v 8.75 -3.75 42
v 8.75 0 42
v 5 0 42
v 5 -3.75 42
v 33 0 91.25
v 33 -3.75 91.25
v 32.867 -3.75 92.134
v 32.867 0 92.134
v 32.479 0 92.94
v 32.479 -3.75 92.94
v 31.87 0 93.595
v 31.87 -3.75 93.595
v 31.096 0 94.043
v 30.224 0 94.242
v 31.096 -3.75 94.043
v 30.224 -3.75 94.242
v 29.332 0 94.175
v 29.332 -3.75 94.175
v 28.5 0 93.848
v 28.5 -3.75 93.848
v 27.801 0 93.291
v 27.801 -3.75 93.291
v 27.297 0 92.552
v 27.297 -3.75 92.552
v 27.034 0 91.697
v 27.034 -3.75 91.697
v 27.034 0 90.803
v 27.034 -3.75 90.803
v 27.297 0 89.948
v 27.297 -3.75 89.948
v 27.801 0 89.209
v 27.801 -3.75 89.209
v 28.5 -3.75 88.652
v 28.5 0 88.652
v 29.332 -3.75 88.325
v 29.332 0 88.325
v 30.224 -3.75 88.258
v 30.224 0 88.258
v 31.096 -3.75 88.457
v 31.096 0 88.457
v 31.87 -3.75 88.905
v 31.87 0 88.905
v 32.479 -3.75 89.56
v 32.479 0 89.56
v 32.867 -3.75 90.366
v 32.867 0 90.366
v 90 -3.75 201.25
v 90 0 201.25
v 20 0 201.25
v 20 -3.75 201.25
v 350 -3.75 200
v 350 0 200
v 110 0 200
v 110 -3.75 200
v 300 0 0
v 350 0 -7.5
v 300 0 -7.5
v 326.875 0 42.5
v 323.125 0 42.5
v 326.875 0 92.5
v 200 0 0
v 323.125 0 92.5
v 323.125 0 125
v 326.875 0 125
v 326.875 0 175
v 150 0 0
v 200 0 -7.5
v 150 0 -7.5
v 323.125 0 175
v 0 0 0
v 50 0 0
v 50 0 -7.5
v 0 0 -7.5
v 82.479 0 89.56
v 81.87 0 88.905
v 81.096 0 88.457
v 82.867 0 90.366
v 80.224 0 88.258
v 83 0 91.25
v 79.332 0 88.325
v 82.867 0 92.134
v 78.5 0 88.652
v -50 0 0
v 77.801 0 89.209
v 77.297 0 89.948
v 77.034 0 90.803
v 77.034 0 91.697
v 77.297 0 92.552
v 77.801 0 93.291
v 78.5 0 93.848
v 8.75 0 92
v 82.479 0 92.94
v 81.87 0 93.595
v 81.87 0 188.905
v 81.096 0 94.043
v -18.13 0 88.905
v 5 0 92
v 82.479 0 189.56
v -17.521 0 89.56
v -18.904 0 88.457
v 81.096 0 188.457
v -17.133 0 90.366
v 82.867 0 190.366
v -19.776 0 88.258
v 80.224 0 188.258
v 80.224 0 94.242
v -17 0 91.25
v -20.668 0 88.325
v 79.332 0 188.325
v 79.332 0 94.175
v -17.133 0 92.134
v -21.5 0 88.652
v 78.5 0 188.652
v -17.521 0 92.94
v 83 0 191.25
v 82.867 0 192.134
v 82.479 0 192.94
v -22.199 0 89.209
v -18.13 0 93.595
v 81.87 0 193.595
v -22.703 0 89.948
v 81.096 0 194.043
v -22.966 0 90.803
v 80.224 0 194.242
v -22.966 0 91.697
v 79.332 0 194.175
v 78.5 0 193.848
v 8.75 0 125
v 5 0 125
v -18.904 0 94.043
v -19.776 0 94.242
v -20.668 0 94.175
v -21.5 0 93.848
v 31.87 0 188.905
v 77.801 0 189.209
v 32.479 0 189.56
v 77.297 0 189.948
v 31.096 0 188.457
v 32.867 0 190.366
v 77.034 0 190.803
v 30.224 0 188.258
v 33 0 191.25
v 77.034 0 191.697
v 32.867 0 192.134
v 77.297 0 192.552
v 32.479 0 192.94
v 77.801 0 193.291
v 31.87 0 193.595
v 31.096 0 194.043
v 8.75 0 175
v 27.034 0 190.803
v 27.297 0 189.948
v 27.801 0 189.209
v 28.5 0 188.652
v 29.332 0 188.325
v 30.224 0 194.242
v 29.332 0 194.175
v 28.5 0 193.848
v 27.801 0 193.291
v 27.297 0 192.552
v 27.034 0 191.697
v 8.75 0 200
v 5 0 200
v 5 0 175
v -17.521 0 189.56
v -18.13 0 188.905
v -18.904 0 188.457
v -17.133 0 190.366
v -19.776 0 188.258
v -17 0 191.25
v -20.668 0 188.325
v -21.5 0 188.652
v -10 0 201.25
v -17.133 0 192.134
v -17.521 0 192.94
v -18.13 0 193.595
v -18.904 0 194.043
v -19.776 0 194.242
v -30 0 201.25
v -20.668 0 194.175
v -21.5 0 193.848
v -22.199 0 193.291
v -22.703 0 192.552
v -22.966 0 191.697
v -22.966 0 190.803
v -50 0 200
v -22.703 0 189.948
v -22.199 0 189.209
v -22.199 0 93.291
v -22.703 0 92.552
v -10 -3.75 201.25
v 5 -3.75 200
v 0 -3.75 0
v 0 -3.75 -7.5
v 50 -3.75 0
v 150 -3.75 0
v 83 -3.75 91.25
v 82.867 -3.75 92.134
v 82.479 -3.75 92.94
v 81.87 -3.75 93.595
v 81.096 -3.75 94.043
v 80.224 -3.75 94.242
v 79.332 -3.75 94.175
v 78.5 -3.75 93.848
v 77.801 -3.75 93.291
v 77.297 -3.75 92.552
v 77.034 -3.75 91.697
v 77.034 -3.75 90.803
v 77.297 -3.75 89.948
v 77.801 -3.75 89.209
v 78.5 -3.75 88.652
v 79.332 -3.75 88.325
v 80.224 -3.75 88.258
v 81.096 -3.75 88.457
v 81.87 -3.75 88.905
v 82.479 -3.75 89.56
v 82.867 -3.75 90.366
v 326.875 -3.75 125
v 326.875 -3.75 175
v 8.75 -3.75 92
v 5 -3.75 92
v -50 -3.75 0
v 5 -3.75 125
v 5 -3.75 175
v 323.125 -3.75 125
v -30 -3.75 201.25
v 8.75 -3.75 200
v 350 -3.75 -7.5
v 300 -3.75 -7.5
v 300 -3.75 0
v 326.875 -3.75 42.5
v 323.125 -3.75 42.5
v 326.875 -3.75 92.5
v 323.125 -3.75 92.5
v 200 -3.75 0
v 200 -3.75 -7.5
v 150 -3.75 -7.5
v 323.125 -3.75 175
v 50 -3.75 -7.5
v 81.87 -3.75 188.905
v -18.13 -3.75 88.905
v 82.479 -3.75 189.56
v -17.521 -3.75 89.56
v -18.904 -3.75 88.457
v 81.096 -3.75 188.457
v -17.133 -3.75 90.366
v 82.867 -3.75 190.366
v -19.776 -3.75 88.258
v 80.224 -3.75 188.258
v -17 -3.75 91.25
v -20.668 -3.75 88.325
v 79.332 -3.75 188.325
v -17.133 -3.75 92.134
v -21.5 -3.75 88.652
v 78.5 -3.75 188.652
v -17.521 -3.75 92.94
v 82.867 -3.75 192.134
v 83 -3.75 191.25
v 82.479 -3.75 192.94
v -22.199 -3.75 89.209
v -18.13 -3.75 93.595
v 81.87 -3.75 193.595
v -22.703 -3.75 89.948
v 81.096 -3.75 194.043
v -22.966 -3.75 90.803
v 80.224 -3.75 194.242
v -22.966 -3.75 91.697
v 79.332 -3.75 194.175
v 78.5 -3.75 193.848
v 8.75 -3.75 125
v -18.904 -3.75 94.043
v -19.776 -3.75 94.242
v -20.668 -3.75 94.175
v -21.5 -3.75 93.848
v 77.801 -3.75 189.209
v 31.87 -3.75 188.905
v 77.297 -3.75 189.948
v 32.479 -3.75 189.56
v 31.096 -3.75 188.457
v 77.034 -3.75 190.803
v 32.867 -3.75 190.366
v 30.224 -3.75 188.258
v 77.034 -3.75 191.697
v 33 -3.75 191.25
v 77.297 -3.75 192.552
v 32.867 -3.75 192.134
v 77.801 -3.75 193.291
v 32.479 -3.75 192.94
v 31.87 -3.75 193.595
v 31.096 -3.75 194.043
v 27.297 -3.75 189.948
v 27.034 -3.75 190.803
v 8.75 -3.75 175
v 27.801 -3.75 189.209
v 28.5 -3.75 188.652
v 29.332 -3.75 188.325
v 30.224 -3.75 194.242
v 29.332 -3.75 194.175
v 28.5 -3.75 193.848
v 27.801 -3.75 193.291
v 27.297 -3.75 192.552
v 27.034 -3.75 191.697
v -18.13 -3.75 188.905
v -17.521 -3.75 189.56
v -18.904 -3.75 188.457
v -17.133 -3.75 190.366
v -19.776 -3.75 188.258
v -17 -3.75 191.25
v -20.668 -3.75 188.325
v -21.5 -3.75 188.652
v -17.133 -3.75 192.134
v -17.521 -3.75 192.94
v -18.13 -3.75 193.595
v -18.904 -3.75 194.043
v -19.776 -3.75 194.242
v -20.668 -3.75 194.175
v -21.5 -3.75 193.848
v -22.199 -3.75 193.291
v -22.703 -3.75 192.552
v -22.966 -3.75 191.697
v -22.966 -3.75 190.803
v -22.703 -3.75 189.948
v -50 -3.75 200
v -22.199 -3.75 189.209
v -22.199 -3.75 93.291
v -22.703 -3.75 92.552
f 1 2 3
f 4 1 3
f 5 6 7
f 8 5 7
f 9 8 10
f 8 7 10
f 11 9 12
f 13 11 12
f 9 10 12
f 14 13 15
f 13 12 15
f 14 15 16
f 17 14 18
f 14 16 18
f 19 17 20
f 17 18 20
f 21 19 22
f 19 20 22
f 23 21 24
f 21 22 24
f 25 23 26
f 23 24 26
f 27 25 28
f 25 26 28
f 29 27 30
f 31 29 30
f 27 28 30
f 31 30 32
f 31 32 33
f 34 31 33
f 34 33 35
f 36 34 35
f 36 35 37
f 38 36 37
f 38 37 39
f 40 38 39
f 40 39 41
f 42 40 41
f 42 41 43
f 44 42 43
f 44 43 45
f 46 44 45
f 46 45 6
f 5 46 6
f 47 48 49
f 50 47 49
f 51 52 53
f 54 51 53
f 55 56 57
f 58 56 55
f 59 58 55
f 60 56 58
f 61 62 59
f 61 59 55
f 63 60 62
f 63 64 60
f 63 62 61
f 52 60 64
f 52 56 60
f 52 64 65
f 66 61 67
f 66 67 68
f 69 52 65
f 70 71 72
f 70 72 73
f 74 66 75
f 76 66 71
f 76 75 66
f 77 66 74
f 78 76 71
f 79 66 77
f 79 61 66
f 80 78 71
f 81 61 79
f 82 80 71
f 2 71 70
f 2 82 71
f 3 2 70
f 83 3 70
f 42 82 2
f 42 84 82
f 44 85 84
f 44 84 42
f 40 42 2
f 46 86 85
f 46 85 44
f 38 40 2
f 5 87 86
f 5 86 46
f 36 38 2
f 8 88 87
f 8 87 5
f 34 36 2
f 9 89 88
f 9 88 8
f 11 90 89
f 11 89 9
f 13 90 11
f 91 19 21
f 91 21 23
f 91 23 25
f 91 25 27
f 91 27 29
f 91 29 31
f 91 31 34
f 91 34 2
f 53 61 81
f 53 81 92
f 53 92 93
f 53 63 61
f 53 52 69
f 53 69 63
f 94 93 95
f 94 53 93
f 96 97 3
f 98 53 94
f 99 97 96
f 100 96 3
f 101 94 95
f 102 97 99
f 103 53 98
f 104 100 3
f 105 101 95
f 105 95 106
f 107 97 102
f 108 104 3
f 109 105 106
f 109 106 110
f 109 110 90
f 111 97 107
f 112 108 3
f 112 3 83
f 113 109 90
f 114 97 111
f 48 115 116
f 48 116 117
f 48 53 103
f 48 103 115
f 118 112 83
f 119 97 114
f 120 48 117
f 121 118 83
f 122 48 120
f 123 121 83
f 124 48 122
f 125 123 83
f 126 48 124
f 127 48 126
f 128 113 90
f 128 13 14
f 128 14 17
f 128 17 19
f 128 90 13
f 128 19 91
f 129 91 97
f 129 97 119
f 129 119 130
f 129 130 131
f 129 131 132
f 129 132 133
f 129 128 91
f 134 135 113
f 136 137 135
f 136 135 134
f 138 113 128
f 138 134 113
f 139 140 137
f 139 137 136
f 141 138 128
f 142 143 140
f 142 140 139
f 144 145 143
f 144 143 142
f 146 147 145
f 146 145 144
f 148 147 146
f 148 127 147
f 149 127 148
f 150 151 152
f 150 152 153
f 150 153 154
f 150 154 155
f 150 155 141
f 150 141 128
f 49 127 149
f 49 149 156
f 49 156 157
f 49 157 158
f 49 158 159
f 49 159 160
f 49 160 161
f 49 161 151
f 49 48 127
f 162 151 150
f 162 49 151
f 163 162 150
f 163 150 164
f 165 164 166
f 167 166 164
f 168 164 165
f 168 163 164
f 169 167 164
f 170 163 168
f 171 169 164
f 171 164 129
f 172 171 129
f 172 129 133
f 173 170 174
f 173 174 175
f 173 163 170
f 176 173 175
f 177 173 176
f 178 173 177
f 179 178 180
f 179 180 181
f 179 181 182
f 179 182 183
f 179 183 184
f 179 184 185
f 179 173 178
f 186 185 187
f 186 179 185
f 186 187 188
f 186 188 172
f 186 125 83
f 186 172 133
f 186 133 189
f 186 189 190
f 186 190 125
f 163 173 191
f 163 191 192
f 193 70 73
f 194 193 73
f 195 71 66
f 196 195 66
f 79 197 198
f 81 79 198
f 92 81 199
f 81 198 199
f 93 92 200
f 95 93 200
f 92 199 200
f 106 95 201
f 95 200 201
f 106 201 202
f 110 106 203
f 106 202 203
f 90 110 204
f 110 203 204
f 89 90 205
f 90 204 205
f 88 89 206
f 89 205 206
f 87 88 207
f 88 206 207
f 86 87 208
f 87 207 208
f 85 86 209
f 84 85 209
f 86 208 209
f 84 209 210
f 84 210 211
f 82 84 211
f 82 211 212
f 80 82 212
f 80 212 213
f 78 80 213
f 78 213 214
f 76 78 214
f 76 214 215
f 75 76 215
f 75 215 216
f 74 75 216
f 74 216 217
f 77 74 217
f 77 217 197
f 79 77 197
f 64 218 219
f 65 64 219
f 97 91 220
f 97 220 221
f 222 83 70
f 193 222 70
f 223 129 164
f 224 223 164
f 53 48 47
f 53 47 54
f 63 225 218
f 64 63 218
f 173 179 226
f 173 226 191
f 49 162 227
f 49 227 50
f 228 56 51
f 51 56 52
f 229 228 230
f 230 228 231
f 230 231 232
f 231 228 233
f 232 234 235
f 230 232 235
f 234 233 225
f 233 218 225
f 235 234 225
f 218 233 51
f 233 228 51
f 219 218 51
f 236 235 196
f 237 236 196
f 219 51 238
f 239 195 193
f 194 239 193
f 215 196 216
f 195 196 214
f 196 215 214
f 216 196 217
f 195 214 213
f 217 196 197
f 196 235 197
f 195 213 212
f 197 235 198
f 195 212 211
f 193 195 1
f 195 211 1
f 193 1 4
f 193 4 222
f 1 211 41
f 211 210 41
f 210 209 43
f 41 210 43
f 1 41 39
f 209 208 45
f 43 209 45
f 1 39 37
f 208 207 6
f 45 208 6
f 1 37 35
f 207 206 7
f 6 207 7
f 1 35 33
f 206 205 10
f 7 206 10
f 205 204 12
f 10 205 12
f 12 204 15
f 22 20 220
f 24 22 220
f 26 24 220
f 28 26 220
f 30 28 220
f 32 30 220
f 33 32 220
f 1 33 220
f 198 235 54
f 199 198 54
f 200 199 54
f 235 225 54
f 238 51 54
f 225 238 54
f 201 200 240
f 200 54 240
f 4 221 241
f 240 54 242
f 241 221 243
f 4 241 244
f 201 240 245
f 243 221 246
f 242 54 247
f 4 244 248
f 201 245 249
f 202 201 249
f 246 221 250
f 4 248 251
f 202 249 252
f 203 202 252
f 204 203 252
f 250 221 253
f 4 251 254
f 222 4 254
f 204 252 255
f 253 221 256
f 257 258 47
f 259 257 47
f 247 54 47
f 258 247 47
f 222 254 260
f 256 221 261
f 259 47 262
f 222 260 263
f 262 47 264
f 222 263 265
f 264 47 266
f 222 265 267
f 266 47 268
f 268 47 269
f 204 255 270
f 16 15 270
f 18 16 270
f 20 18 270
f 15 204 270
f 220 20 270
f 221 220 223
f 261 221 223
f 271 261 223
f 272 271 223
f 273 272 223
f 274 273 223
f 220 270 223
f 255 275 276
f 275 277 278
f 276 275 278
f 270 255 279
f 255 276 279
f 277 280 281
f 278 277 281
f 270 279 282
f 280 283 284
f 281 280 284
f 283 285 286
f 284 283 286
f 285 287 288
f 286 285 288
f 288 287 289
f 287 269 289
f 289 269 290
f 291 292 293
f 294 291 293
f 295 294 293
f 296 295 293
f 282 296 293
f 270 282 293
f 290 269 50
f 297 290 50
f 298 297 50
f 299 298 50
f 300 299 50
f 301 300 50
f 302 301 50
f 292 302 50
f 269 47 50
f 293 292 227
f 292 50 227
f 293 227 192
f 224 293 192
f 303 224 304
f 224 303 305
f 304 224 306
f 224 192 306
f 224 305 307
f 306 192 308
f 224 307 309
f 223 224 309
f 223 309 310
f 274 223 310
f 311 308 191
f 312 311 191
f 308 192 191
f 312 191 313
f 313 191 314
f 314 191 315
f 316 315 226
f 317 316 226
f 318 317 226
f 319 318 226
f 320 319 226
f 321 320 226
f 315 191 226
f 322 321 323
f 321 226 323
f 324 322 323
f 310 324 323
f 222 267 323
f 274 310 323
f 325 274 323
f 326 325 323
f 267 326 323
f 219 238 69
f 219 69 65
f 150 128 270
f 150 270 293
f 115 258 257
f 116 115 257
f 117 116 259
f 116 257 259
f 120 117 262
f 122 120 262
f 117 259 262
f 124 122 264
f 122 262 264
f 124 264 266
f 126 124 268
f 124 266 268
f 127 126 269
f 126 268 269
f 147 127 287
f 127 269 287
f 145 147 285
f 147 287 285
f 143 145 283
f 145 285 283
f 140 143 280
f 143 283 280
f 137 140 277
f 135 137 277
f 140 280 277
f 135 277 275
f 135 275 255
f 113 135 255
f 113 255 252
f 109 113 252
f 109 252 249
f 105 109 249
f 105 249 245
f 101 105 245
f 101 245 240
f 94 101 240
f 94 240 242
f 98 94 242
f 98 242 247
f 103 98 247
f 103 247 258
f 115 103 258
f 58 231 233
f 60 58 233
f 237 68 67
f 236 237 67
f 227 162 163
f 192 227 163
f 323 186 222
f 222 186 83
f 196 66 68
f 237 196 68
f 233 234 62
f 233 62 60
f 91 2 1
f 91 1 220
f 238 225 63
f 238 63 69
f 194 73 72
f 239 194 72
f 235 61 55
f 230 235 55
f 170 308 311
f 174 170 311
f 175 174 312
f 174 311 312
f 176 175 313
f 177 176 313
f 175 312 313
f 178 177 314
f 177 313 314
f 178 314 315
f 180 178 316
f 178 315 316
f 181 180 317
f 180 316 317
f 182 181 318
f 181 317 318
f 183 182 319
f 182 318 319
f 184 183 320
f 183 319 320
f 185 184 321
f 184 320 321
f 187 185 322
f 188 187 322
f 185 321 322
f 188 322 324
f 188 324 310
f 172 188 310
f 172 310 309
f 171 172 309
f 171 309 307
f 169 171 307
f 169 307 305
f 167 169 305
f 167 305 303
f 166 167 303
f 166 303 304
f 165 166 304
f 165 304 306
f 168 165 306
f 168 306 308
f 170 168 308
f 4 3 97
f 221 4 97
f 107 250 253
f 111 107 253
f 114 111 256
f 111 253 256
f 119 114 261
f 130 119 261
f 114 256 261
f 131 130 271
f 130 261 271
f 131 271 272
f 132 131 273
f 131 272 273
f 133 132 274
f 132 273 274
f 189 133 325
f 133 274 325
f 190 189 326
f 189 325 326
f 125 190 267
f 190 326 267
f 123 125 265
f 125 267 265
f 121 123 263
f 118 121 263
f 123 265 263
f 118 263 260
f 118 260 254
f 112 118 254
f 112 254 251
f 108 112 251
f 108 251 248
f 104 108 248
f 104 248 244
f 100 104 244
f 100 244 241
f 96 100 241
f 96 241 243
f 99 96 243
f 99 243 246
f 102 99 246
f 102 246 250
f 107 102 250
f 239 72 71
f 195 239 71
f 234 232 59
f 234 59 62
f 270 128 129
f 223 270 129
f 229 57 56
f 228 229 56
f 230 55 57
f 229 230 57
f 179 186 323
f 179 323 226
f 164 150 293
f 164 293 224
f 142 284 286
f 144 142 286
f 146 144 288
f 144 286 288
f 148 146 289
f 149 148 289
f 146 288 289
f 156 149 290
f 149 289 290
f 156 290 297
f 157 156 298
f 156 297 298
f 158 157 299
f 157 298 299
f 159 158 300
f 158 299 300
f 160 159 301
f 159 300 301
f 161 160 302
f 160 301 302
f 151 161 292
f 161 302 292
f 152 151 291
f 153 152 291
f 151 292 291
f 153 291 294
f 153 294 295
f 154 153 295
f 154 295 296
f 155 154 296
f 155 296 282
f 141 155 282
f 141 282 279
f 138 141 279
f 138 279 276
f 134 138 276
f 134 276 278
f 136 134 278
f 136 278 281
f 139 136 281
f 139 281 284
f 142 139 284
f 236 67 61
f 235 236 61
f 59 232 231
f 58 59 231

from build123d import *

# Parameters (mm, degrees)
F1_DEPTH  = 3.75
F2_W      = 3.75
F2_H      = 50
F3_DEPTH  = 3.75
F4_W      = 20
F4_H      = 3.75
F5_DEPTH  = 1.25
F7_D      = 6
F7_DEPTH  = 4
F7_TIP    = 1.8025818571
F8_W      = 30
F8_H      = 1.25
F9_DEPTH  = 3.75
F10_W     = 3.75
F10_H     = 50
F11_DEPTH = 3.75


# Not quite as in the source:
# - a feature names something its author has since deleted; it is built from what else it names


with BuildPart() as f1:
    # F0 (on Front) → F1 (new body)
    with BuildSketch(Plane.XZ):
        Polygon((50, -7.5), (50, 0), (150, 0), (150, -7.5), (200, -7.5), (200, 0), (300, 0), (300, -7.5), (350, -7.5), (350, 0), (350, 200), (0, 200), (-50, 200), (-50, 0), (0, 0), (0, -7.5), align=None)
    extrude(amount=F1_DEPTH)

    # F2 (on face) → F3 (cut)
    with BuildSketch(Plane.XZ.offset(3.75)):
        with Locations((325, 150)):
            Rectangle(F2_W, F2_H)
        with Locations((325, 67.5)):
            Rectangle(F2_W, F2_H)
    extrude(amount=-F3_DEPTH, mode=Mode.SUBTRACT)

    # F4 (on face) → F5 (join)
    with BuildSketch(Plane.XY.offset(200)):
        with Locations((80, -1.875)):
            Rectangle(F4_W, F4_H)
        with Locations((30, -1.875)):
            Rectangle(F4_W, F4_H)
        with Locations((-20, -1.875)):
            Rectangle(F4_W, F4_H)
    extrude(amount=F5_DEPTH)

    # F7
    with Locations(Plane(origin=(0, 0, 0), x_dir=(-1, 0, 0), z_dir=(0, 1, 0))):
        with Locations((-80, 91.25), (-80, 191.25), (-30, 91.25), (20, 91.25), (20, 191.25), (-30, 191.25)):
            Hole(F7_D / 2, depth=F7_DEPTH)
            with Locations((0, 0, -(F7_DEPTH + F7_TIP / 2))):  # 118° drill point
                Cone(0, F7_D / 2, F7_TIP, mode=Mode.SUBTRACT)

    # F8 (on face) → F9 (join)
    with BuildSketch(Plane(origin=(0, 0, 0), x_dir=(-1, 0, 0), z_dir=(0, 1, 0))):
        with Locations((-55, 200.625)):
            Rectangle(F8_W, F8_H)
        Polygon((30, 201.25), (30, 200), (50, 200), align=None)
        Polygon((-90, 200), (-90, 201.25), (-110, 200), align=None)
        Polygon((10, 201.25), (-5, 200), (10, 200), align=None)
        Polygon((-8.75, 200), (-20, 201.25), (-20, 200), align=None)
    extrude(amount=-F9_DEPTH)

    # F10 (on face) → F11 (cut)
    with BuildSketch(Plane(origin=(0, 0, 0), x_dir=(-1, 0, 0), z_dir=(0, 1, 0))):
        with Locations((-6.875, 150)):
            Rectangle(F10_W, F10_H)
        with Locations((-6.875, 67)):
            Rectangle(F10_W, F10_H)
    extrude(amount=-F11_DEPTH, mode=Mode.SUBTRACT)


solid = f1.part
